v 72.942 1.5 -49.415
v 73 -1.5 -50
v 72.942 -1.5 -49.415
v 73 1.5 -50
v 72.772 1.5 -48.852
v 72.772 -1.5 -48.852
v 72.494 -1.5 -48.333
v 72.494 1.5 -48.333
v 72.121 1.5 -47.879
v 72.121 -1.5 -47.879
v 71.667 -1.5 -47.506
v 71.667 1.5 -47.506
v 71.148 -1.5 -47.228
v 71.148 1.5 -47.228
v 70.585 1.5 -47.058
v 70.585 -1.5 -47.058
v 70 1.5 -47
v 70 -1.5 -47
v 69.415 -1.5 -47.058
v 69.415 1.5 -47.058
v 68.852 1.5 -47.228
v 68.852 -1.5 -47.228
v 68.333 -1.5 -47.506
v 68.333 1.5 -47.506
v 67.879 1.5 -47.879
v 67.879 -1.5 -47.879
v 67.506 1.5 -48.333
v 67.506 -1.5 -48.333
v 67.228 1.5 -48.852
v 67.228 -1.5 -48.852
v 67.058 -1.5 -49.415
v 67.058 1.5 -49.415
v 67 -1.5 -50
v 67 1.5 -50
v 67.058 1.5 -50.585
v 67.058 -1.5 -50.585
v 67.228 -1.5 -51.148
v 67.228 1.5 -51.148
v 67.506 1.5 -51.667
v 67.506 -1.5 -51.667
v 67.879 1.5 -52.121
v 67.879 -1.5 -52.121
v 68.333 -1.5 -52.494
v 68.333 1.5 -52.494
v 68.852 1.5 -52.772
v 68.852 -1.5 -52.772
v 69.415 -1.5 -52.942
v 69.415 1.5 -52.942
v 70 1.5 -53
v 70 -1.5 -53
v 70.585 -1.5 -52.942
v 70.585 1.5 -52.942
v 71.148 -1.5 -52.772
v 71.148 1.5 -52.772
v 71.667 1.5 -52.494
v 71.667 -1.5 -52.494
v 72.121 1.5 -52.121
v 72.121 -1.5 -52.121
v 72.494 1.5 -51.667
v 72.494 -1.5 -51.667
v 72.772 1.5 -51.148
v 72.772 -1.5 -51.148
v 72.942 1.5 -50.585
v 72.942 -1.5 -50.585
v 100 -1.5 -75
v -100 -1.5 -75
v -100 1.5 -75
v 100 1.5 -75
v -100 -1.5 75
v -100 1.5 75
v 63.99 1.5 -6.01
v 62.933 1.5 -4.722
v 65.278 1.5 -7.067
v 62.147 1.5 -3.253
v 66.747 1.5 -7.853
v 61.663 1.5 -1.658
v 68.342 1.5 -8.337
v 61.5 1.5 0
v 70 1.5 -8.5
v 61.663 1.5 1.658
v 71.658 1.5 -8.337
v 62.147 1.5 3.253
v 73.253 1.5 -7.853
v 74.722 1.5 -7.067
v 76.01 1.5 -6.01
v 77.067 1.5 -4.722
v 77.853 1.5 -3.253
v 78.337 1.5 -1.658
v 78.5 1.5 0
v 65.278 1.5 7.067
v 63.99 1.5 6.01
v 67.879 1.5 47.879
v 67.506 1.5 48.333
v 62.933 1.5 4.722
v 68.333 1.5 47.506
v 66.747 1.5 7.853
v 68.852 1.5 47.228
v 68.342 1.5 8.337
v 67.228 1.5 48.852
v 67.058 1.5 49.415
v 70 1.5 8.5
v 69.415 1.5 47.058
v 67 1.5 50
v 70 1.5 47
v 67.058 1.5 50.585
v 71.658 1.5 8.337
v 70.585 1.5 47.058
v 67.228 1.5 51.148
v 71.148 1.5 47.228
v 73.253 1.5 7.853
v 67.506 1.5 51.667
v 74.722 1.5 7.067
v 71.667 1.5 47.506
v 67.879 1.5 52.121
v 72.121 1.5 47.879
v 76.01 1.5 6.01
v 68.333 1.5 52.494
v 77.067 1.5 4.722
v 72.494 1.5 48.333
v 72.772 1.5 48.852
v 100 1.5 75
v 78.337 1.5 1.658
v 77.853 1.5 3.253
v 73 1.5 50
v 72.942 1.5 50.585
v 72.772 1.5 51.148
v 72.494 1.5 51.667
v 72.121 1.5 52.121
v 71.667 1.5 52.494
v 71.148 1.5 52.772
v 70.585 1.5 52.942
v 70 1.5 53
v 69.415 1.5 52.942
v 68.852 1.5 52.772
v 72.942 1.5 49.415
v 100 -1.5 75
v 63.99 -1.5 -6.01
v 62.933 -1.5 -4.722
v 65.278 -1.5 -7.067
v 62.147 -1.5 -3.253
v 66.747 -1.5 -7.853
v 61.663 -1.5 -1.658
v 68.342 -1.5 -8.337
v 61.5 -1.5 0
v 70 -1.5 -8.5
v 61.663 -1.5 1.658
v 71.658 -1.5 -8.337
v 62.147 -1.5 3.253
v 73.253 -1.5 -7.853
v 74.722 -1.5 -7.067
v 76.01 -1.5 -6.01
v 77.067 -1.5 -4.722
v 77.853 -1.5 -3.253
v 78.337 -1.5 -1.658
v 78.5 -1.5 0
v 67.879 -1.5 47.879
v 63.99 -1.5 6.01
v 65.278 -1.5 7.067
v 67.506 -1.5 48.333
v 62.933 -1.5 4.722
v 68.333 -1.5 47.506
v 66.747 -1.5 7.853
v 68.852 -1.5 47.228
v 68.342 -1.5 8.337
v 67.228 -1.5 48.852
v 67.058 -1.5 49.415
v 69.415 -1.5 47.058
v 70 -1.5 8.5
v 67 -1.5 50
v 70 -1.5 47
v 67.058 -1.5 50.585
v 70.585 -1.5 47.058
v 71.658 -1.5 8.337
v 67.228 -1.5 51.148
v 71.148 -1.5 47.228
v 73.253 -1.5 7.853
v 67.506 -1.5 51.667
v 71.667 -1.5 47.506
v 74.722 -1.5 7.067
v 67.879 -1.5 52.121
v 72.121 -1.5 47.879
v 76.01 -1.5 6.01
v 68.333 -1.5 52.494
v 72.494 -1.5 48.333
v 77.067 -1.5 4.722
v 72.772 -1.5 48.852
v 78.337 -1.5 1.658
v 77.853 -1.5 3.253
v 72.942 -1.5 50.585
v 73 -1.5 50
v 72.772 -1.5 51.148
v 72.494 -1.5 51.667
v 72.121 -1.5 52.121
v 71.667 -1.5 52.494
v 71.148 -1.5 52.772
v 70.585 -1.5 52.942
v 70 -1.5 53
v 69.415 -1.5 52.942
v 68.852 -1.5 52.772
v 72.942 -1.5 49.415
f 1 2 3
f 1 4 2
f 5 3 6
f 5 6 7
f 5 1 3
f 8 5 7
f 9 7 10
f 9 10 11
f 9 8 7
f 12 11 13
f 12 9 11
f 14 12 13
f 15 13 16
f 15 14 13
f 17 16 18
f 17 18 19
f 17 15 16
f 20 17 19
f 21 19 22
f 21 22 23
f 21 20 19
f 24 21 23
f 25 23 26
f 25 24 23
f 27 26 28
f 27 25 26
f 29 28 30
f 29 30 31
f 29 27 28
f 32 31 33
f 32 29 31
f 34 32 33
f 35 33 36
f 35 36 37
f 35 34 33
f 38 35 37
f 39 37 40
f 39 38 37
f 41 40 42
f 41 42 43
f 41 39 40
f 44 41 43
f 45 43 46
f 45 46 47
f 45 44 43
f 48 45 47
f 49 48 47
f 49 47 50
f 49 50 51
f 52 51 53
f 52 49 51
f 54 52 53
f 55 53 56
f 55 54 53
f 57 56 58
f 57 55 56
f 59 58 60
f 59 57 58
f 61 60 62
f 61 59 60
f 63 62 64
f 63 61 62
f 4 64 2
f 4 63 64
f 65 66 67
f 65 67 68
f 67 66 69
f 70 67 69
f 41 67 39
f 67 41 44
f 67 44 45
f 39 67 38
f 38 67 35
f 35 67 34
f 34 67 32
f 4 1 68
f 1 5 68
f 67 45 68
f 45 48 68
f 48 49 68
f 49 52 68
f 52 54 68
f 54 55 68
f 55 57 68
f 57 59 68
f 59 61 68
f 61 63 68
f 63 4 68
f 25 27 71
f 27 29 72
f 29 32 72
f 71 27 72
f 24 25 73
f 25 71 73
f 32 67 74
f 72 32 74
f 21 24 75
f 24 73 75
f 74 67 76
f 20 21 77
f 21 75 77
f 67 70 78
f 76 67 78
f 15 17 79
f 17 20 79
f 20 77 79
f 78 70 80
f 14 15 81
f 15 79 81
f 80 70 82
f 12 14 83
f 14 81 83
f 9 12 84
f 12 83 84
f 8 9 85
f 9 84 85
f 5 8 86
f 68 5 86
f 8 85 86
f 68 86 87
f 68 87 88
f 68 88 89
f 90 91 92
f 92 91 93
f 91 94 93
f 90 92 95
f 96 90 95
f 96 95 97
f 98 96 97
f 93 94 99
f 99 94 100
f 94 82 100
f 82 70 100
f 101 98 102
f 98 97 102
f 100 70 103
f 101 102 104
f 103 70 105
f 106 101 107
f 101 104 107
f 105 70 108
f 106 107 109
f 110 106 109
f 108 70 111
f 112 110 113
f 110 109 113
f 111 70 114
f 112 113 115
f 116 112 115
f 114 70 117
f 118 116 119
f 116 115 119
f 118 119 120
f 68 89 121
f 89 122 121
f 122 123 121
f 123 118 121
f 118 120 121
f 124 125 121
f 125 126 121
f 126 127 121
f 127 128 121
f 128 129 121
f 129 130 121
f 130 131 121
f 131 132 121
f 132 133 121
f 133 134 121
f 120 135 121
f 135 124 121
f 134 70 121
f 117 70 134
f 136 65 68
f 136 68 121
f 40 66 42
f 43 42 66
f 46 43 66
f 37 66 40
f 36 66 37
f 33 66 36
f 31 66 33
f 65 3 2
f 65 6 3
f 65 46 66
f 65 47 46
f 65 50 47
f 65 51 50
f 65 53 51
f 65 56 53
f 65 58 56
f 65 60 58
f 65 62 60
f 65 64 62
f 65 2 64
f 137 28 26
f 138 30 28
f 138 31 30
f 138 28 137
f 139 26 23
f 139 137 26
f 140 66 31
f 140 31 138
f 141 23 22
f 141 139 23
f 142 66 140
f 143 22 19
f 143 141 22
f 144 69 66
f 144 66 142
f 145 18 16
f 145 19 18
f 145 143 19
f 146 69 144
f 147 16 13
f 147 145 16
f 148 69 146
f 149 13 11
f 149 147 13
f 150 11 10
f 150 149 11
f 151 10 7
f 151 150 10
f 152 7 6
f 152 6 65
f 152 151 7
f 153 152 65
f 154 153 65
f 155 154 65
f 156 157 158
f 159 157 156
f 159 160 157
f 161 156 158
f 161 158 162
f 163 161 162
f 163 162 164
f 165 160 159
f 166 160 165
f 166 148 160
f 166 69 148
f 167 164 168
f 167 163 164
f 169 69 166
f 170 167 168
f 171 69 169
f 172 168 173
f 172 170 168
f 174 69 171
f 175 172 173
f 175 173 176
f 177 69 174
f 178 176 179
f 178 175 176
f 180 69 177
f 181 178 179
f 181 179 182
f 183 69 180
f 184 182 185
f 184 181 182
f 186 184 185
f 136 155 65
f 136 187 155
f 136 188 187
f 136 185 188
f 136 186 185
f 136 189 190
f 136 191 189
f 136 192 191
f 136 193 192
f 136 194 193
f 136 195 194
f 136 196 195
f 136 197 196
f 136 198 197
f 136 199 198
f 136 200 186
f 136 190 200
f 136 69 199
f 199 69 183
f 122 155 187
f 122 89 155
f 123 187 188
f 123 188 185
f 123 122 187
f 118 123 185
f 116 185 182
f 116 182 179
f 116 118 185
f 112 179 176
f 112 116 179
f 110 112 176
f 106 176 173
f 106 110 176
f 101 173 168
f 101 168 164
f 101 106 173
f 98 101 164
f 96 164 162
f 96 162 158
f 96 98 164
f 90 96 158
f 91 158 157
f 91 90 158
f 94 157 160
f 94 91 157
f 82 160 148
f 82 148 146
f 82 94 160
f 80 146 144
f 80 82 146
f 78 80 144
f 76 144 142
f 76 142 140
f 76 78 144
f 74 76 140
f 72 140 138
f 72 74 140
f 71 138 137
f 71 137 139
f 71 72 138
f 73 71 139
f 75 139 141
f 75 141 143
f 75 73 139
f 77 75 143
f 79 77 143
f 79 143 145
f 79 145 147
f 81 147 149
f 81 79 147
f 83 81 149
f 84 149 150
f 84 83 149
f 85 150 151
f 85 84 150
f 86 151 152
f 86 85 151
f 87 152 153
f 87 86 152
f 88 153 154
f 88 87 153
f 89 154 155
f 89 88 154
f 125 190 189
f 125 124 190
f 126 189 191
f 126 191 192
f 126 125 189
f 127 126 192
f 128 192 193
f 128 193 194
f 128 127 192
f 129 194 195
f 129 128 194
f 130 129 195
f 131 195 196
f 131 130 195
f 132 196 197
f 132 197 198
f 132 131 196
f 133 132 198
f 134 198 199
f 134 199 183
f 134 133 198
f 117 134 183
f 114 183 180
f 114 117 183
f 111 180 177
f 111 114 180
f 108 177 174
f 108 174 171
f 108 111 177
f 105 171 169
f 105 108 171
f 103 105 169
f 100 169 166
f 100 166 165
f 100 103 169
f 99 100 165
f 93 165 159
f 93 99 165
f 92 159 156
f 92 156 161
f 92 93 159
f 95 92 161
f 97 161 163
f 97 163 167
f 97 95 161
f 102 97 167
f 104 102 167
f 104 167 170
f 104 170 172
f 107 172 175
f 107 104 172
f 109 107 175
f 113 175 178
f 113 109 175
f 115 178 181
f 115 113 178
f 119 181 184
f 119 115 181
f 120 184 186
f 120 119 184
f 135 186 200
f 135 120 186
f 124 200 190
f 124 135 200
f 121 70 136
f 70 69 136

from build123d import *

# Parameters (mm, degrees)
F0_W     = 200
F0_H     = 150
F0_R     = 3
F0_R_2   = 8.5
F1_DEPTH = 1.5


with BuildPart() as f1:
    # F0 (on Front) → F1 (new body, symmetric)
    with BuildSketch(Plane.XZ):
        Rectangle(F0_W, F0_H)
        with Locations((70, -50)):
            Circle(F0_R, mode=Mode.SUBTRACT)
        with Locations((70, 0)):
            Circle(F0_R_2, mode=Mode.SUBTRACT)
        with Locations((70, 50)):
            Circle(F0_R, mode=Mode.SUBTRACT)
    extrude(amount=F1_DEPTH, both=True)


solid = f1.part
